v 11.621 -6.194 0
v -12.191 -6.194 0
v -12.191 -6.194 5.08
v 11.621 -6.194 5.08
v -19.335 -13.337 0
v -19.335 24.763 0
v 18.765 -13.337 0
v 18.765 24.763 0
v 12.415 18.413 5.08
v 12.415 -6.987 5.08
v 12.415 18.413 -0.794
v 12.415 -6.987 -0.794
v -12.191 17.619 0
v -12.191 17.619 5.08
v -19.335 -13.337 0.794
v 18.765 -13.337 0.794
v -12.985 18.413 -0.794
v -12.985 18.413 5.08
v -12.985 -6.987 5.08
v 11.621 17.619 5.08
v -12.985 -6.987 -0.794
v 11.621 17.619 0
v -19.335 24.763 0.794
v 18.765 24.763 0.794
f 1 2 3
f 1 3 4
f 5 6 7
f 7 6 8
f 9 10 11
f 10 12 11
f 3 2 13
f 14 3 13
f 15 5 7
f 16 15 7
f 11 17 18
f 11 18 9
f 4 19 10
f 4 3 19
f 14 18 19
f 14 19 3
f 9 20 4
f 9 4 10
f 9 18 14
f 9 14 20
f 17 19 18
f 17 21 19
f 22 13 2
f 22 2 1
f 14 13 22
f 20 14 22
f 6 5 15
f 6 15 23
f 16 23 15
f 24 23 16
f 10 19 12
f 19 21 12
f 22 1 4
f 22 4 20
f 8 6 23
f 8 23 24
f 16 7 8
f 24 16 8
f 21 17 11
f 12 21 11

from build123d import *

# Parameters (mm, degrees)
F0_W     = 38.1
F0_H     = 38.1
F1_DEPTH = 0.79375
F2_W     = 25.4
F2_H     = 25.4
F4_DEPTH = 0.79375
F5_W     = 25.4
F5_H     = 25.4
F5_W_2   = 23.8125
F5_H_2   = 23.8125
F6_DEPTH = 5.08


with BuildPart() as f1:
    # F0 (on Top) → F1 (new body)
    with BuildSketch(Plane.XY):
        with Locations((-0.2852454782, 5.7126945901)):
            Rectangle(F0_W, F0_H)
    extrude(amount=F1_DEPTH)


with BuildPart() as f4:
    # F2 (on Top) → F4 (new body)
    with BuildSketch(Plane.XY):
        with Locations((-0.2852454782, 5.7126945901)):
            Rectangle(F2_W, F2_H)
    extrude(amount=-F4_DEPTH)

    # F5 (on face) → F6 (join)
    with BuildSketch(Plane.XY):
        with Locations((-0.2852454782, 5.7126945901)):
            Rectangle(F5_W, F5_H)
        with Locations((-0.2852454782, 5.7126945901)):
            Rectangle(F5_W_2, F5_H_2, mode=Mode.SUBTRACT)
    extrude(amount=F6_DEPTH)


solid = Compound([f1.part, f4.part])
